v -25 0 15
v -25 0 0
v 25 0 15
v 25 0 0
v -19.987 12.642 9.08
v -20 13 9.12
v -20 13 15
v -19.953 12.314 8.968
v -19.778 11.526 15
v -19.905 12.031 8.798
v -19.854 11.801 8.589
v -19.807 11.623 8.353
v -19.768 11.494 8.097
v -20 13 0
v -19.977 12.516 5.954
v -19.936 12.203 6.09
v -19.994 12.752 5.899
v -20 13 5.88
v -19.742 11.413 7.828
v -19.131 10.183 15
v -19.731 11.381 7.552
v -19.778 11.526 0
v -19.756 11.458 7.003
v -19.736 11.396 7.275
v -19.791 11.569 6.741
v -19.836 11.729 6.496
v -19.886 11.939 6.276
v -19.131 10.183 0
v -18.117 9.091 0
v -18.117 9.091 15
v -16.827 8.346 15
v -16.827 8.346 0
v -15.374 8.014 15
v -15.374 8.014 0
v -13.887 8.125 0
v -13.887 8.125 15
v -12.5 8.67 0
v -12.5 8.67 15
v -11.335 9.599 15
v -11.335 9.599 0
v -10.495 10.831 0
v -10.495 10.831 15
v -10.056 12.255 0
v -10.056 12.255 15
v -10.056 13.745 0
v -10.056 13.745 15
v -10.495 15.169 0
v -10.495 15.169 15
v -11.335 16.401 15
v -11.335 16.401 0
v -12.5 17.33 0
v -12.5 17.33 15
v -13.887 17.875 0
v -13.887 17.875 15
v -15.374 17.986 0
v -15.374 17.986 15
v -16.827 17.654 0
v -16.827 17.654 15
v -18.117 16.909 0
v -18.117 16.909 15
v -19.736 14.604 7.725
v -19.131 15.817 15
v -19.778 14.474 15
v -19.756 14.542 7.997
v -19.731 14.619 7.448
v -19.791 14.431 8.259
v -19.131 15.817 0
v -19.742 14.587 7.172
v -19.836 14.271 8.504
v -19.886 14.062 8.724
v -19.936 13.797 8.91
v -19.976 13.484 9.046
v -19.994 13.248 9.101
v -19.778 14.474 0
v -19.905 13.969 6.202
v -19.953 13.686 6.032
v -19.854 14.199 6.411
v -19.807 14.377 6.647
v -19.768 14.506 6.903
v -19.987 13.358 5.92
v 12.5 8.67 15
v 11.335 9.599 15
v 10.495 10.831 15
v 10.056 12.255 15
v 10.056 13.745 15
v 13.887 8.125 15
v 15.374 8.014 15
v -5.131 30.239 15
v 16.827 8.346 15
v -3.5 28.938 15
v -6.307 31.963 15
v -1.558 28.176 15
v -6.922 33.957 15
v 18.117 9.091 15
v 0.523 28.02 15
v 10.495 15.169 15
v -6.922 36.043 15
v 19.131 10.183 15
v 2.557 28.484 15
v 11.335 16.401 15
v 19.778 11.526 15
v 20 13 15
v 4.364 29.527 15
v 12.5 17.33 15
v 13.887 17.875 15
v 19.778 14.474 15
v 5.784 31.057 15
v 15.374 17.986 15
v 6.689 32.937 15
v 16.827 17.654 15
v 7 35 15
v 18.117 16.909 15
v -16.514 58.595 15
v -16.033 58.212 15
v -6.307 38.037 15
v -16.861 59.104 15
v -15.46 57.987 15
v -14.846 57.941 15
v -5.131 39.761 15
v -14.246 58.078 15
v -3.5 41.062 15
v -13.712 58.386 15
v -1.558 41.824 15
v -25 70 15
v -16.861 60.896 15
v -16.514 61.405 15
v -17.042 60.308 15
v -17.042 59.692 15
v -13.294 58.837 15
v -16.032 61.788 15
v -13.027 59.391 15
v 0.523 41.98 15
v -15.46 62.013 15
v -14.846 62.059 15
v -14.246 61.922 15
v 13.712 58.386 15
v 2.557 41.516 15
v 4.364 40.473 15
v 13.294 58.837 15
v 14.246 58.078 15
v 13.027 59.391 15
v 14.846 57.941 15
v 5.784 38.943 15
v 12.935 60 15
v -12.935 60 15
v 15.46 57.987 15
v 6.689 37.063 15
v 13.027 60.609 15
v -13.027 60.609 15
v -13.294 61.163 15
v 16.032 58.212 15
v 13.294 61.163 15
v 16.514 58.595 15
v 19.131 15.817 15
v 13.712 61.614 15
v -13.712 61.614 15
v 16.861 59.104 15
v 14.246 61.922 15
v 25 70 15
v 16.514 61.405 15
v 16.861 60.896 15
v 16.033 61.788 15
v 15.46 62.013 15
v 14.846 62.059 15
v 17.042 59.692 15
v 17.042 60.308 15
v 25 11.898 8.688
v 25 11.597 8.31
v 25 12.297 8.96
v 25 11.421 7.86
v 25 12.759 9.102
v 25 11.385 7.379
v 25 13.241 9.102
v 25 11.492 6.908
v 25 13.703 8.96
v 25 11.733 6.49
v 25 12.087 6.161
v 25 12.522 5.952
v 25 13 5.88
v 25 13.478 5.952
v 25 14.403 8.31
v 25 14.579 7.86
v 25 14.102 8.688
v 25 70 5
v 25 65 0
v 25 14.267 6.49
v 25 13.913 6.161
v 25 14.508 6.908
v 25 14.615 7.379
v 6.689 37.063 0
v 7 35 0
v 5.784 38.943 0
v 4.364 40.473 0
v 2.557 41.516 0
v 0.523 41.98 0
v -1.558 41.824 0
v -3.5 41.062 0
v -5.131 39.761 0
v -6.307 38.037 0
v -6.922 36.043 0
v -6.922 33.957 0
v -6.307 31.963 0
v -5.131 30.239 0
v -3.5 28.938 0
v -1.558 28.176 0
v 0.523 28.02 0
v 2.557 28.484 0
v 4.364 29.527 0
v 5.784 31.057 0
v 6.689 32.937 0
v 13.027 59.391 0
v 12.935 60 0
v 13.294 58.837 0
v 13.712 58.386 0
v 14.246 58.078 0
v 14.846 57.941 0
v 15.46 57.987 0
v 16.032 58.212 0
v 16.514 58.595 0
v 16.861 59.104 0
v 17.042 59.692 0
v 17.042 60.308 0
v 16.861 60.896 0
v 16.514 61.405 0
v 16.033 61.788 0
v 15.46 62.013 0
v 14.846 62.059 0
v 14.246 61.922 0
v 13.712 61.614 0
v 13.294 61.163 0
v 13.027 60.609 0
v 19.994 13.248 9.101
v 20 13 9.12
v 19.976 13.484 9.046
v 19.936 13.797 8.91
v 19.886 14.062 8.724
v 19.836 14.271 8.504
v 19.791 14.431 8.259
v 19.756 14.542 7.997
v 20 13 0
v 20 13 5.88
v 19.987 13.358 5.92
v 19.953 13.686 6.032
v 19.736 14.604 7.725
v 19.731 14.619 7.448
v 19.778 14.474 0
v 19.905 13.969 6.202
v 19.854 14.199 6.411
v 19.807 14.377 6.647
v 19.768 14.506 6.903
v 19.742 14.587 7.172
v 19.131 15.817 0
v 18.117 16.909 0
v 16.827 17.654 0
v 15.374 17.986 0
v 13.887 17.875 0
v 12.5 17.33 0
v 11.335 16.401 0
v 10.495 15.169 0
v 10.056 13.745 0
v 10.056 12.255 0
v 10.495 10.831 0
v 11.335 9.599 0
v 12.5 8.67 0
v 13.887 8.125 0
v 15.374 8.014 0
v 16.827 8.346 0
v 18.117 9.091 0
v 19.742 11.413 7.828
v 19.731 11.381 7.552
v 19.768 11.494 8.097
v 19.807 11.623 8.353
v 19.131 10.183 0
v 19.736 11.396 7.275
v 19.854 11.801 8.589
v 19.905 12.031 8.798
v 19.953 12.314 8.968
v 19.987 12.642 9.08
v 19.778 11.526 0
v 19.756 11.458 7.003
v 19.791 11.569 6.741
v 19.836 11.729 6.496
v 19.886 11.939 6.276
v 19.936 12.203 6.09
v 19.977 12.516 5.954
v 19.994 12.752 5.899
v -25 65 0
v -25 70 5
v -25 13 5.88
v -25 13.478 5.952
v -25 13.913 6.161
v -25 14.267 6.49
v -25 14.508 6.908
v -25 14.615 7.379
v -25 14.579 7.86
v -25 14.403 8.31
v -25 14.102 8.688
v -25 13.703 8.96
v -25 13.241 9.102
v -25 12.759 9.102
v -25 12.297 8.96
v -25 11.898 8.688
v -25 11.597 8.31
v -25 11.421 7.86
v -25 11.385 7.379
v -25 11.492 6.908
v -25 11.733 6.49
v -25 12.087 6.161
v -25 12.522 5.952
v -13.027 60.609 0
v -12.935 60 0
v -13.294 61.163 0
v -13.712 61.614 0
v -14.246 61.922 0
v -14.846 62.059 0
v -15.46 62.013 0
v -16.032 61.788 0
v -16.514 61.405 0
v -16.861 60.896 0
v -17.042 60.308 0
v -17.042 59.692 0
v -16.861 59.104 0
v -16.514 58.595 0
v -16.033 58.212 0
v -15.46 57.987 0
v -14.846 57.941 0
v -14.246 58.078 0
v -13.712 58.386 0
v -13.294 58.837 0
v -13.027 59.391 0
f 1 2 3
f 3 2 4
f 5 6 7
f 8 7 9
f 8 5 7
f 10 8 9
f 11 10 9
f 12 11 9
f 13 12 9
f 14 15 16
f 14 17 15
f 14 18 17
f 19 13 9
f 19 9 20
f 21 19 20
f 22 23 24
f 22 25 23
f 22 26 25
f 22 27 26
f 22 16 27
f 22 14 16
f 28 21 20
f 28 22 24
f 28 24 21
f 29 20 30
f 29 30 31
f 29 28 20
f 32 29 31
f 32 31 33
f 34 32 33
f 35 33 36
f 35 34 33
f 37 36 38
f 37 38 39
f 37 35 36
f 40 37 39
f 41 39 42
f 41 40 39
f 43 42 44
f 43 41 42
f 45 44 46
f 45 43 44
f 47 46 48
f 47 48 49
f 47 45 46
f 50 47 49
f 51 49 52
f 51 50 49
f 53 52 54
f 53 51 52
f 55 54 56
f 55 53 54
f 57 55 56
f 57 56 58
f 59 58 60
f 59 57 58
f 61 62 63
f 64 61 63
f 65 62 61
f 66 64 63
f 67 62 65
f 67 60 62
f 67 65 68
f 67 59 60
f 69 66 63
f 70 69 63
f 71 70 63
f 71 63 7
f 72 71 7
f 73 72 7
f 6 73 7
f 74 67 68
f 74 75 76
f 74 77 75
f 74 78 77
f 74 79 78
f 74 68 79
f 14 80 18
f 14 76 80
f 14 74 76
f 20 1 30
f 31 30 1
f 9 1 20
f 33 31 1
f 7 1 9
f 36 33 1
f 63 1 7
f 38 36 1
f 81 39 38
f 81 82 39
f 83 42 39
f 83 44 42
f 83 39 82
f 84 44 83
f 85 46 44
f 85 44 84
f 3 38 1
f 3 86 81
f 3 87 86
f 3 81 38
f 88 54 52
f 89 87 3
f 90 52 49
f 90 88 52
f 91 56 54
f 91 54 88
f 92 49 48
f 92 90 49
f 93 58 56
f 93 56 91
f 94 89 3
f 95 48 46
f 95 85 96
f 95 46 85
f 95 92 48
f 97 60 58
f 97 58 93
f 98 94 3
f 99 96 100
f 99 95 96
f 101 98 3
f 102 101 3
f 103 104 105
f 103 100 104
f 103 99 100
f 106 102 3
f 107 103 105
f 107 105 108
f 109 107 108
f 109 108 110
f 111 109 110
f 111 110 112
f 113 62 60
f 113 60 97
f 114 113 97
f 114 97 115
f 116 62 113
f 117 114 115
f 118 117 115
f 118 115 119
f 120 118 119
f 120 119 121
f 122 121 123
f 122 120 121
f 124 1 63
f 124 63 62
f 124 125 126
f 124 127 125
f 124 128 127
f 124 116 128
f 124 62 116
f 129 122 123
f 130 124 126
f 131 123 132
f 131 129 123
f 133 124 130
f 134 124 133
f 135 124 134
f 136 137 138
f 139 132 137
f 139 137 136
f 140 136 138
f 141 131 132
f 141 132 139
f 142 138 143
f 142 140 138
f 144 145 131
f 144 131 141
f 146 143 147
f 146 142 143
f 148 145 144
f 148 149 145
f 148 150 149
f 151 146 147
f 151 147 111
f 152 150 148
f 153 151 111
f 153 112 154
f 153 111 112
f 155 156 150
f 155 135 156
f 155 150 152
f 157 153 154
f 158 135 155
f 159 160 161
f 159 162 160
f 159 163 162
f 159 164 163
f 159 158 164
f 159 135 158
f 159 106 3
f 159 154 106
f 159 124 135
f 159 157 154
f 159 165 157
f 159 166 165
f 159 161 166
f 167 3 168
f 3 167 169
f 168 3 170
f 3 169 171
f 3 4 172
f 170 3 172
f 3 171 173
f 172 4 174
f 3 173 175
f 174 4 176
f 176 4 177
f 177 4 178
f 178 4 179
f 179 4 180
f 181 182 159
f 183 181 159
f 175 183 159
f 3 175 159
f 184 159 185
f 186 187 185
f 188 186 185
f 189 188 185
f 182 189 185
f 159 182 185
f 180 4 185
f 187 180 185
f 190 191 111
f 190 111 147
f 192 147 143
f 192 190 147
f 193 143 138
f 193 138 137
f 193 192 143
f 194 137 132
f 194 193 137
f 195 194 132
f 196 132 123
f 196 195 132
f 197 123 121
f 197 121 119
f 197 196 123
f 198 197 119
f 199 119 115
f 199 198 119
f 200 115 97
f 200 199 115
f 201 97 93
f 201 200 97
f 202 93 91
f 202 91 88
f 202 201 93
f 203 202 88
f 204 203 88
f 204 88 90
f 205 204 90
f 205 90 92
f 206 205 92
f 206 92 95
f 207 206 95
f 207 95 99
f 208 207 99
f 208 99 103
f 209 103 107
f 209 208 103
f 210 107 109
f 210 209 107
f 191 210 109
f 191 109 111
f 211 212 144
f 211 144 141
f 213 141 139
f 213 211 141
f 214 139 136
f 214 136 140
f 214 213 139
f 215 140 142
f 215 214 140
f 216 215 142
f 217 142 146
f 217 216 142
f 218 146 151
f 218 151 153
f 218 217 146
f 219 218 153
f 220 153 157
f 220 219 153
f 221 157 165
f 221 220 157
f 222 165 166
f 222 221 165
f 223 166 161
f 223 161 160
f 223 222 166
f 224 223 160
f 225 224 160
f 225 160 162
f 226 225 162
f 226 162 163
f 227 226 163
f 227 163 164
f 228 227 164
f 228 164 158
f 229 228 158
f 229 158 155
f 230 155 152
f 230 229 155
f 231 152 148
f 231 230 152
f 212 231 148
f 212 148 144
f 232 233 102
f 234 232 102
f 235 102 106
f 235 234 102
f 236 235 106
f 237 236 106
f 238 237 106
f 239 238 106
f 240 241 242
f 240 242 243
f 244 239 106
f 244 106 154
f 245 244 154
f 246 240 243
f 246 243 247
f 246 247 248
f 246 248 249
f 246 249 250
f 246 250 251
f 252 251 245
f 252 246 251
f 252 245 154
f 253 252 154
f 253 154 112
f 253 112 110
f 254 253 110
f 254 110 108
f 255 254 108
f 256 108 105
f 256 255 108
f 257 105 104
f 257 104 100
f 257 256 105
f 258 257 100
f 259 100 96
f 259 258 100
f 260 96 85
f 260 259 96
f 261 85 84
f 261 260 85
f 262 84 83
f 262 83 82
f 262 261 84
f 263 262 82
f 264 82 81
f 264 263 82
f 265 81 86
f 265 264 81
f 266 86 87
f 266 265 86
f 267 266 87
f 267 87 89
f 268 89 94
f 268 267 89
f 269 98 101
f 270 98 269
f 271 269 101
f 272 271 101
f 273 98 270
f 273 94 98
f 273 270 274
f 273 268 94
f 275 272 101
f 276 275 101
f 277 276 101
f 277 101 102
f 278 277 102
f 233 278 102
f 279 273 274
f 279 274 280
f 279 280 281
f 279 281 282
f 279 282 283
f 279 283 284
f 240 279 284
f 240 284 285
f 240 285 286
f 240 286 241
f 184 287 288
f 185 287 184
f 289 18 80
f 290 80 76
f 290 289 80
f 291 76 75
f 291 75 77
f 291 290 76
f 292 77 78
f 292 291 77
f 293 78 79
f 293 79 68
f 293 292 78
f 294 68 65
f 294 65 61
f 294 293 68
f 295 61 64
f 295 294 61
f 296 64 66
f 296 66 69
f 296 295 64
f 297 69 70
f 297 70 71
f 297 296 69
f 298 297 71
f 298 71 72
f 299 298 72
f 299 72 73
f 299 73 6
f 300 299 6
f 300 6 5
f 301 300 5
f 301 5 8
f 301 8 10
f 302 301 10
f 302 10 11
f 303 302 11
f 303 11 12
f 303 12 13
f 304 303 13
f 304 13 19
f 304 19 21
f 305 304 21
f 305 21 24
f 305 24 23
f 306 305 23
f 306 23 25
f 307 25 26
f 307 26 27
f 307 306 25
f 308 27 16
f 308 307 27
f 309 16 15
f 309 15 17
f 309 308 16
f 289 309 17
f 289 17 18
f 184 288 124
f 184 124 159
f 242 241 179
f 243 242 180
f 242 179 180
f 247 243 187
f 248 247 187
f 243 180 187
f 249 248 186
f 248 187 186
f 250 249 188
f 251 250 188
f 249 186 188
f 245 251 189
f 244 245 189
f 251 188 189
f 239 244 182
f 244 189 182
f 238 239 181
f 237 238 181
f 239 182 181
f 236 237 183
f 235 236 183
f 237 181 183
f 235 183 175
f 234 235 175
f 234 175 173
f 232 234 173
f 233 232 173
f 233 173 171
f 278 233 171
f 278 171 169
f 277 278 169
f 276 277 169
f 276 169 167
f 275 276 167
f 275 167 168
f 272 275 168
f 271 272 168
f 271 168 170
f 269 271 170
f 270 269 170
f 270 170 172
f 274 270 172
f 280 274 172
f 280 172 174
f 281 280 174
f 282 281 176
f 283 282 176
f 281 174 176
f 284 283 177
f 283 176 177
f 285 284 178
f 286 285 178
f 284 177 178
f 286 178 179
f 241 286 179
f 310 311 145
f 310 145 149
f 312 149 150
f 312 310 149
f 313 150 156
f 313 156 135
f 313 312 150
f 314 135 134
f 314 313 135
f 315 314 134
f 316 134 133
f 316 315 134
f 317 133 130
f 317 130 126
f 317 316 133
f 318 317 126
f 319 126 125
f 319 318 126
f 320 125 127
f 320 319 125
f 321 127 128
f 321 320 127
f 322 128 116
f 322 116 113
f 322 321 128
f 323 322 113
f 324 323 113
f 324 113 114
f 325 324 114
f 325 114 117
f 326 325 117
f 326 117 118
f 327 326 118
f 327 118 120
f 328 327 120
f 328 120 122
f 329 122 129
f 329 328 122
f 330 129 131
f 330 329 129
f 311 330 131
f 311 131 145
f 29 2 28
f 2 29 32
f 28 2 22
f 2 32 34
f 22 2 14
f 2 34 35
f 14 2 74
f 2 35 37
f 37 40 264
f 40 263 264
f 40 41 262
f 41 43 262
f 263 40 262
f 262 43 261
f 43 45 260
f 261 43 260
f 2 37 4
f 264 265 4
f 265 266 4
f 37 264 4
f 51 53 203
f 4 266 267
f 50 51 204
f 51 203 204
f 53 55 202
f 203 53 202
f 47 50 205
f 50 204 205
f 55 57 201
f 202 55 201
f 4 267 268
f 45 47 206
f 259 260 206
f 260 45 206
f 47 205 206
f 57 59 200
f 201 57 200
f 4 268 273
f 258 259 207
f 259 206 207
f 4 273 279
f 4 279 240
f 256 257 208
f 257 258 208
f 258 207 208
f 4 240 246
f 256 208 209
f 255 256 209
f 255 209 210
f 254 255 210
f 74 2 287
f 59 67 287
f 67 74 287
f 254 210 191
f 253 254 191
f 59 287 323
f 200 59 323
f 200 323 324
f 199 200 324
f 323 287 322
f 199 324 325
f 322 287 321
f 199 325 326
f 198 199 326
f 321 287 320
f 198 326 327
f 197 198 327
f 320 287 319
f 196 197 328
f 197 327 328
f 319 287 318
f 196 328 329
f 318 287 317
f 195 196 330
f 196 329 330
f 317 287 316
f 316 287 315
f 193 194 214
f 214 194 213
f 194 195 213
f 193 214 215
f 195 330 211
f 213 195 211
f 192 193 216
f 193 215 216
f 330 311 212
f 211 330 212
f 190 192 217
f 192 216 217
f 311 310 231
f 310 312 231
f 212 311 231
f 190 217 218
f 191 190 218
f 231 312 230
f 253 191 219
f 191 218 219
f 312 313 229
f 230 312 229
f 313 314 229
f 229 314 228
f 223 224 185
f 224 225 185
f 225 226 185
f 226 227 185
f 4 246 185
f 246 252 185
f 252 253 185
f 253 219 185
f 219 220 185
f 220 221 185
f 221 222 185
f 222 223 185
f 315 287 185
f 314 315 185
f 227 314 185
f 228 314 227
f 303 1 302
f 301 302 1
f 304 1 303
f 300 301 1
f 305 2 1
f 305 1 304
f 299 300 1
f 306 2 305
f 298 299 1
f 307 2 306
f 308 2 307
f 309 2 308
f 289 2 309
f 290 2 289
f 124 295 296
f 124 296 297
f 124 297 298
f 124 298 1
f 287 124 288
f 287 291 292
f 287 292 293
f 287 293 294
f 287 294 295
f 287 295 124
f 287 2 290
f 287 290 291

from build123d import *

# Parameters (mm, degrees)
ESQUISSE1_W             = 50
ESQUISSE1_H             = 70
ESQUISSE1_R             = 5
ESQUISSE1_R_2           = 7
ESQUISSE1_R_3           = 2.065
BASE_EXTRUSION_DEPTH    = 15
CHANFREIN3_SIZE         = 5
ENL_V_MAT_EXTRU_1_REACH = 89.321
ESQUISSE10_R            = 1.62


with BuildPart() as part:
    # Esquisse1 → Base-Extrusion (new body)
    with BuildSketch(Plane.XY):
        with Locations((0, 35)):
            Rectangle(ESQUISSE1_W, ESQUISSE1_H)
        with Locations((15, 13)):
            Circle(ESQUISSE1_R, mode=Mode.SUBTRACT)
        with Locations(Location((-15, 13, 0), (0, 0, 180))):
            Circle(ESQUISSE1_R, mode=Mode.SUBTRACT)
        with Locations((0, 35)):
            Circle(ESQUISSE1_R_2, mode=Mode.SUBTRACT)
        with Locations((-15, 60)):
            Circle(ESQUISSE1_R_3, mode=Mode.SUBTRACT)
        with Locations(Location((15, 60, 0), (0, 0, 180))):
            Circle(ESQUISSE1_R_3, mode=Mode.SUBTRACT)
    extrude(amount=BASE_EXTRUSION_DEPTH)

    # Chanfrein3
    chanfrein3_edges = [part.edges().sort_by_distance(p)[0] for p in [
        (0, 70, 0),
    ]]
    chamfer(chanfrein3_edges, length=CHANFREIN3_SIZE)

    # Esquisse10 → Enlèv. mat.-Extru.1 (cut, up to next)
    with BuildSketch(Plane(origin=(25, 0, 0), x_dir=(0, 0, -1), z_dir=(1, 0, 0)), mode=Mode.PRIVATE) as enl_v_mat_extru_1_sk1:
        with Locations((-7.5, 13)):
            Circle(ESQUISSE10_R)
    enl_v_mat_extru_1_tool1 = extrude(enl_v_mat_extru_1_sk1.sketch, amount=-ENL_V_MAT_EXTRU_1_REACH, mode=Mode.PRIVATE) & part.part
    enl_v_mat_extru_1 = enl_v_mat_extru_1_tool1.solids().sort_by_distance((25, 13, 7.5))[0]
    add(enl_v_mat_extru_1, mode=Mode.SUBTRACT)

    # Symétrie1: Enlèv. mat.-Extru.1 across plane
    add(enl_v_mat_extru_1.mirror(Plane(origin=(0, 0, 0), x_dir=(0, 0, 1), z_dir=(1, 0, 0))), mode=Mode.SUBTRACT)


solid = part.part
